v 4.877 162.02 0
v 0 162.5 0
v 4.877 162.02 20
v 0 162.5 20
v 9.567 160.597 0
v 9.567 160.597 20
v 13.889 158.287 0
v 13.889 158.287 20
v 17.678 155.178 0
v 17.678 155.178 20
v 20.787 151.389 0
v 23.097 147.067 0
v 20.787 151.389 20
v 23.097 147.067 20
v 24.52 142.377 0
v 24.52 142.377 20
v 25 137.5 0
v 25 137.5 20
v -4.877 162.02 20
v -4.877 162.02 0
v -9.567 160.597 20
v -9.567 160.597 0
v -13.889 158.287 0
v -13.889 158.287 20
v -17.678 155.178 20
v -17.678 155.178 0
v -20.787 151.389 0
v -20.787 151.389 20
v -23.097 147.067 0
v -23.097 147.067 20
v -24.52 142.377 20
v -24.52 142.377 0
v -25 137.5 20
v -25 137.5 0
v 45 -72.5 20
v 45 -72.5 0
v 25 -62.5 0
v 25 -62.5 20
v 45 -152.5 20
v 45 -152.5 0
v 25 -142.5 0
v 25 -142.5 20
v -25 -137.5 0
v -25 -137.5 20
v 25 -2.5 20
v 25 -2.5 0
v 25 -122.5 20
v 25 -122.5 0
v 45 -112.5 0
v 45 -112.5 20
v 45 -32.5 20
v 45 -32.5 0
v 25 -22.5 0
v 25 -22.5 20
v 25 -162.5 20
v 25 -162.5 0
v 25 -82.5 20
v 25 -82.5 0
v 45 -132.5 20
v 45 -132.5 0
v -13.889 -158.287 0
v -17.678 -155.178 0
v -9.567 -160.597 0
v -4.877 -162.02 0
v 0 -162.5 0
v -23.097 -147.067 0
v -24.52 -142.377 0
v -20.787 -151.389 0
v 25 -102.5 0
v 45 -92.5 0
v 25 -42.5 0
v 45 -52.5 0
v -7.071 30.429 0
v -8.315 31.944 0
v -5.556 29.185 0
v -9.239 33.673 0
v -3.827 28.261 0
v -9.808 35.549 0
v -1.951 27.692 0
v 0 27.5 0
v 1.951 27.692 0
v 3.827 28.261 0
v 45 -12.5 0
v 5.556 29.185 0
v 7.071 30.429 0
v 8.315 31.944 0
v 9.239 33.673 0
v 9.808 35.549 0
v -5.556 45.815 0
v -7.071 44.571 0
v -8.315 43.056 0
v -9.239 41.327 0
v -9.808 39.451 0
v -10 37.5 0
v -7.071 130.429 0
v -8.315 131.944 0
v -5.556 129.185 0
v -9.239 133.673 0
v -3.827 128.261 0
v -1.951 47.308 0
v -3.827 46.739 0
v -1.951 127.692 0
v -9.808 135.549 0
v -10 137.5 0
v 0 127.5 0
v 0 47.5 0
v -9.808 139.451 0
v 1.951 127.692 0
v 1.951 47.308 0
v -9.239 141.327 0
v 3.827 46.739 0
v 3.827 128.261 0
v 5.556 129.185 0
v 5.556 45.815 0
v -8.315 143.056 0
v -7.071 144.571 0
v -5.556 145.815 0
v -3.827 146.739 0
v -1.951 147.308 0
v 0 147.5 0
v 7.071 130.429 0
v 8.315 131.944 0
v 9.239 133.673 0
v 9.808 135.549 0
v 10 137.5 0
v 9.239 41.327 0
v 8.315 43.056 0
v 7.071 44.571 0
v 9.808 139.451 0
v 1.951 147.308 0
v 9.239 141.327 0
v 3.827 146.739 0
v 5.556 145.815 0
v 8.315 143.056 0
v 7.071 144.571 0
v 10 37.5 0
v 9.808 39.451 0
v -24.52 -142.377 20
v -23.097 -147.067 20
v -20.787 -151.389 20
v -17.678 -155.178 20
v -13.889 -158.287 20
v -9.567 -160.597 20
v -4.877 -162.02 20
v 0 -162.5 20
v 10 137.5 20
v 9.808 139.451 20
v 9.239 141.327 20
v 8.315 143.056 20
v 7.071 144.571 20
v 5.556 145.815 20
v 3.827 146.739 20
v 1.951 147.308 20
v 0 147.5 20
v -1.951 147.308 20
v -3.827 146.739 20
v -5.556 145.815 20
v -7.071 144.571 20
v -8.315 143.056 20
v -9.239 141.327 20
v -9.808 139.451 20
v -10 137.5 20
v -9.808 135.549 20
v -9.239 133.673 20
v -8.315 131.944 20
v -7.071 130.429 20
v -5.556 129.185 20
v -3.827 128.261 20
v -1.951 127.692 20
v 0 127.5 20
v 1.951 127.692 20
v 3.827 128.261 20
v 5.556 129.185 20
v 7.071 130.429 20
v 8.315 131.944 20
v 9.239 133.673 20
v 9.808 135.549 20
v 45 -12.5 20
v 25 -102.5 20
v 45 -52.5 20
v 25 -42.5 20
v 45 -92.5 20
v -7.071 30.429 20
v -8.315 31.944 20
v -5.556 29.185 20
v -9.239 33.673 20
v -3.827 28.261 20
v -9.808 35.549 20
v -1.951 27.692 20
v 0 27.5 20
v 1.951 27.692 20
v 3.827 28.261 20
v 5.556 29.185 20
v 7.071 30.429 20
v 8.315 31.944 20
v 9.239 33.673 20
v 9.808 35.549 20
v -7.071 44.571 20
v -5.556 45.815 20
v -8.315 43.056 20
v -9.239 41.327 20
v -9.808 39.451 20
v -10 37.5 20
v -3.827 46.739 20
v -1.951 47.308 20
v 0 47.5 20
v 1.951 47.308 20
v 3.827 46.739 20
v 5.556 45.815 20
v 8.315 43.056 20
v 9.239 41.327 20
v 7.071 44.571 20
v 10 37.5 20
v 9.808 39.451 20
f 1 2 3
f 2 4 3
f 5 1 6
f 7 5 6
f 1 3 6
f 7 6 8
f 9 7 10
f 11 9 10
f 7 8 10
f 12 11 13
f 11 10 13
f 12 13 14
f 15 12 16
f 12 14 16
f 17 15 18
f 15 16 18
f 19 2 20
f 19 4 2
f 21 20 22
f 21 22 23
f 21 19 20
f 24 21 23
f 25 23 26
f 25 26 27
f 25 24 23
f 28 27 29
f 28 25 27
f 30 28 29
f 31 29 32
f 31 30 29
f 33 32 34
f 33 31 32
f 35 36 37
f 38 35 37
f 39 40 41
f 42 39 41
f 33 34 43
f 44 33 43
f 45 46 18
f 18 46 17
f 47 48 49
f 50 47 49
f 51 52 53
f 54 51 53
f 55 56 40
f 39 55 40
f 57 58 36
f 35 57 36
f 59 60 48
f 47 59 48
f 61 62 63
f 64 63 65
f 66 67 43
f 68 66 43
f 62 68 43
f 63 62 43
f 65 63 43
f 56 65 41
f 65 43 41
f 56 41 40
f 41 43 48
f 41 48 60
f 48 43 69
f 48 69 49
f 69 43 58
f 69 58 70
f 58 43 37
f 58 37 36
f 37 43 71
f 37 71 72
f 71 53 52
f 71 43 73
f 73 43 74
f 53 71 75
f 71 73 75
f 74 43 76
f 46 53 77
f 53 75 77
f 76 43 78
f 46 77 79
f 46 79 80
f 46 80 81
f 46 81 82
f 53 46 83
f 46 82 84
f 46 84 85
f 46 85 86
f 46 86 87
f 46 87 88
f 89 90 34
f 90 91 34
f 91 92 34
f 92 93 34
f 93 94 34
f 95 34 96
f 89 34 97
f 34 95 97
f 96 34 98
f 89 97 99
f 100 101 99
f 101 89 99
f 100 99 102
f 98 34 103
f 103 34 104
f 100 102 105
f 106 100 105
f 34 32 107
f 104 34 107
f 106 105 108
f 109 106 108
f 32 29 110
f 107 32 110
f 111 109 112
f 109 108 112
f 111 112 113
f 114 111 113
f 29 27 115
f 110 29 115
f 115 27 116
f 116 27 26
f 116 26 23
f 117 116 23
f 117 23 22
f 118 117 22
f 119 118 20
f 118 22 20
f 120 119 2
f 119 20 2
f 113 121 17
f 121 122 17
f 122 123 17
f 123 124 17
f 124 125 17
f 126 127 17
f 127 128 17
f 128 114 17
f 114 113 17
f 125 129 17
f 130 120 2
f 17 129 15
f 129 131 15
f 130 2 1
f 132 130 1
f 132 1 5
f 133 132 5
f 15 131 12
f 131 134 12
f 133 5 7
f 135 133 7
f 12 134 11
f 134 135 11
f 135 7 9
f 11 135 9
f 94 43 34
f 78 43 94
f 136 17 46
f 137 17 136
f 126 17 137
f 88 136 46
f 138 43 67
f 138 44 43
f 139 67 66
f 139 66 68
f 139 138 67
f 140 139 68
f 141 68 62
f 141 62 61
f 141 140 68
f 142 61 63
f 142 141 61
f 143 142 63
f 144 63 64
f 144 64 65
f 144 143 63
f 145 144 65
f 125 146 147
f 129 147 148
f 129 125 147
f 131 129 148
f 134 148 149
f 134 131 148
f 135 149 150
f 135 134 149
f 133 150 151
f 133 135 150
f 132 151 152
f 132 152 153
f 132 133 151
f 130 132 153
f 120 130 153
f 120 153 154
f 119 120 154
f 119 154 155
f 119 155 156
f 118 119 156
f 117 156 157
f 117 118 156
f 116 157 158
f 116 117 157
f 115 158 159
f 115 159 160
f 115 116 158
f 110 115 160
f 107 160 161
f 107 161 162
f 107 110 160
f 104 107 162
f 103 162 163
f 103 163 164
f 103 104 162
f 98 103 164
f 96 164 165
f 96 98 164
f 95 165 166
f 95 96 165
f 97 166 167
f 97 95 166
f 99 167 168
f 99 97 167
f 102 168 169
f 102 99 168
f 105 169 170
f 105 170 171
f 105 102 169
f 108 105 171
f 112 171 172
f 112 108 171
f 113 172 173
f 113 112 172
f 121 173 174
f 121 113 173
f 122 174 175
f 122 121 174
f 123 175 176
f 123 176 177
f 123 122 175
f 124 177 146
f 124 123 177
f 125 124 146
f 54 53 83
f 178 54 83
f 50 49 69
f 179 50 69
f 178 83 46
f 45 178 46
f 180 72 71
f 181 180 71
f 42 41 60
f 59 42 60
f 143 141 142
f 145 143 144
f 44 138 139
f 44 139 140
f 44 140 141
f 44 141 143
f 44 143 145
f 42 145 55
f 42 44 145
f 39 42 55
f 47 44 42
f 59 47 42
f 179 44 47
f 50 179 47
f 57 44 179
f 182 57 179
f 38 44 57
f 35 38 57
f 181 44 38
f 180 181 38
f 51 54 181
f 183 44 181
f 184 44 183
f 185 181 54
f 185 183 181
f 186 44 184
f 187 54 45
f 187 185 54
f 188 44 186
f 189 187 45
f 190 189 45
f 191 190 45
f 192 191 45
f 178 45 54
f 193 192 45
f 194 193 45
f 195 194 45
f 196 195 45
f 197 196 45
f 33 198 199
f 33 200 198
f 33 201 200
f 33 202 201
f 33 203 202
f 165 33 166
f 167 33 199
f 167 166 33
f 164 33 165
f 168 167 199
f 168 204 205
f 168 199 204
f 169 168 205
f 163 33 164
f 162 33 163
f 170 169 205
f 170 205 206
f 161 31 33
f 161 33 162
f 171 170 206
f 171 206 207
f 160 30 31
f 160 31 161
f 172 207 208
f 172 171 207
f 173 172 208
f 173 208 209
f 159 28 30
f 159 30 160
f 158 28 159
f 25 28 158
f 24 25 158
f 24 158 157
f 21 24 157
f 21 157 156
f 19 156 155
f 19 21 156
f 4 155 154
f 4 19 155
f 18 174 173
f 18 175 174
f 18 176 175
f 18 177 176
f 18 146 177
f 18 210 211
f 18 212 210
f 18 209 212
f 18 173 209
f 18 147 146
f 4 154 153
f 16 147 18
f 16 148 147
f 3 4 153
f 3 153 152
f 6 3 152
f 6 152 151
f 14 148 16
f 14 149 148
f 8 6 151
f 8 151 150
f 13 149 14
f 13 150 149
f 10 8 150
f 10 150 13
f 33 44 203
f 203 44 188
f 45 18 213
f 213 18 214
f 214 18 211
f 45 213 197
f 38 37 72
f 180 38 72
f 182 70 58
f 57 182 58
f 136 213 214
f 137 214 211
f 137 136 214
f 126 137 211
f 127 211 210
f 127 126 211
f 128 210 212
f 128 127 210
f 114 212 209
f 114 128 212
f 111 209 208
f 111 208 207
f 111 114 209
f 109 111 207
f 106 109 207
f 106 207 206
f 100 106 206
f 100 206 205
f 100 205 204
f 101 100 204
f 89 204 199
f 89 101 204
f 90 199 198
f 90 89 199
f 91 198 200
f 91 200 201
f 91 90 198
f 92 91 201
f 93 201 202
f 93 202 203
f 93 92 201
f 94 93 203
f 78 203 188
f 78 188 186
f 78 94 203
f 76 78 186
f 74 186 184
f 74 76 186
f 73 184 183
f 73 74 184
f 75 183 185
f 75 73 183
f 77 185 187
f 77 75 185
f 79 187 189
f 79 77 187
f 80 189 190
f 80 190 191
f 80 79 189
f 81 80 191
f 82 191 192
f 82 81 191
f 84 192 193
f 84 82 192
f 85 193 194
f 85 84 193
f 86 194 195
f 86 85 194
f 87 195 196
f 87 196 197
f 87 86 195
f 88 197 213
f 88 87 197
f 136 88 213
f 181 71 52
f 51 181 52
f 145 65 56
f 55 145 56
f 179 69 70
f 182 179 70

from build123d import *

# Parameters (mm, degrees)
ESQUISSE1_R        = 10
BOSS_EXTRU_1_DEPTH = 20
CONG_1_R           = 25


with BuildPart() as part:
    # Esquisse1 → Boss.-Extru.1 (new body)
    with BuildSketch(Plane.XY):
        Polygon((25, 162.5), (-25, 162.5), (-25, -162.5), (25, -162.5), (45, -152.5), (25, -142.5), (45, -132.5), (25, -122.5), (45, -112.5), (25, -102.5), (45, -92.5), (25, -82.5), (45, -72.5), (25, -62.5), (45, -52.5), (25, -42.5), (45, -32.5), (25, -22.5), (45, -12.5), (25, -2.5), align=None)
        with Locations((0, 37.5)):
            Circle(ESQUISSE1_R, mode=Mode.SUBTRACT)
        with Locations((0, 137.5)):
            Circle(ESQUISSE1_R, mode=Mode.SUBTRACT)
    extrude(amount=BOSS_EXTRU_1_DEPTH)

    # Congé1
    cong_1_edges = [part.edges().sort_by_distance(p)[0] for p in [
        (-25, -162.5, 10),
        (25, 162.5, 10),
        (-25, 162.5, 10),
    ]]
    fillet(cong_1_edges, radius=CONG_1_R - 0.0001)  # a hair under: the kernel refuses the full size


solid = part.part
